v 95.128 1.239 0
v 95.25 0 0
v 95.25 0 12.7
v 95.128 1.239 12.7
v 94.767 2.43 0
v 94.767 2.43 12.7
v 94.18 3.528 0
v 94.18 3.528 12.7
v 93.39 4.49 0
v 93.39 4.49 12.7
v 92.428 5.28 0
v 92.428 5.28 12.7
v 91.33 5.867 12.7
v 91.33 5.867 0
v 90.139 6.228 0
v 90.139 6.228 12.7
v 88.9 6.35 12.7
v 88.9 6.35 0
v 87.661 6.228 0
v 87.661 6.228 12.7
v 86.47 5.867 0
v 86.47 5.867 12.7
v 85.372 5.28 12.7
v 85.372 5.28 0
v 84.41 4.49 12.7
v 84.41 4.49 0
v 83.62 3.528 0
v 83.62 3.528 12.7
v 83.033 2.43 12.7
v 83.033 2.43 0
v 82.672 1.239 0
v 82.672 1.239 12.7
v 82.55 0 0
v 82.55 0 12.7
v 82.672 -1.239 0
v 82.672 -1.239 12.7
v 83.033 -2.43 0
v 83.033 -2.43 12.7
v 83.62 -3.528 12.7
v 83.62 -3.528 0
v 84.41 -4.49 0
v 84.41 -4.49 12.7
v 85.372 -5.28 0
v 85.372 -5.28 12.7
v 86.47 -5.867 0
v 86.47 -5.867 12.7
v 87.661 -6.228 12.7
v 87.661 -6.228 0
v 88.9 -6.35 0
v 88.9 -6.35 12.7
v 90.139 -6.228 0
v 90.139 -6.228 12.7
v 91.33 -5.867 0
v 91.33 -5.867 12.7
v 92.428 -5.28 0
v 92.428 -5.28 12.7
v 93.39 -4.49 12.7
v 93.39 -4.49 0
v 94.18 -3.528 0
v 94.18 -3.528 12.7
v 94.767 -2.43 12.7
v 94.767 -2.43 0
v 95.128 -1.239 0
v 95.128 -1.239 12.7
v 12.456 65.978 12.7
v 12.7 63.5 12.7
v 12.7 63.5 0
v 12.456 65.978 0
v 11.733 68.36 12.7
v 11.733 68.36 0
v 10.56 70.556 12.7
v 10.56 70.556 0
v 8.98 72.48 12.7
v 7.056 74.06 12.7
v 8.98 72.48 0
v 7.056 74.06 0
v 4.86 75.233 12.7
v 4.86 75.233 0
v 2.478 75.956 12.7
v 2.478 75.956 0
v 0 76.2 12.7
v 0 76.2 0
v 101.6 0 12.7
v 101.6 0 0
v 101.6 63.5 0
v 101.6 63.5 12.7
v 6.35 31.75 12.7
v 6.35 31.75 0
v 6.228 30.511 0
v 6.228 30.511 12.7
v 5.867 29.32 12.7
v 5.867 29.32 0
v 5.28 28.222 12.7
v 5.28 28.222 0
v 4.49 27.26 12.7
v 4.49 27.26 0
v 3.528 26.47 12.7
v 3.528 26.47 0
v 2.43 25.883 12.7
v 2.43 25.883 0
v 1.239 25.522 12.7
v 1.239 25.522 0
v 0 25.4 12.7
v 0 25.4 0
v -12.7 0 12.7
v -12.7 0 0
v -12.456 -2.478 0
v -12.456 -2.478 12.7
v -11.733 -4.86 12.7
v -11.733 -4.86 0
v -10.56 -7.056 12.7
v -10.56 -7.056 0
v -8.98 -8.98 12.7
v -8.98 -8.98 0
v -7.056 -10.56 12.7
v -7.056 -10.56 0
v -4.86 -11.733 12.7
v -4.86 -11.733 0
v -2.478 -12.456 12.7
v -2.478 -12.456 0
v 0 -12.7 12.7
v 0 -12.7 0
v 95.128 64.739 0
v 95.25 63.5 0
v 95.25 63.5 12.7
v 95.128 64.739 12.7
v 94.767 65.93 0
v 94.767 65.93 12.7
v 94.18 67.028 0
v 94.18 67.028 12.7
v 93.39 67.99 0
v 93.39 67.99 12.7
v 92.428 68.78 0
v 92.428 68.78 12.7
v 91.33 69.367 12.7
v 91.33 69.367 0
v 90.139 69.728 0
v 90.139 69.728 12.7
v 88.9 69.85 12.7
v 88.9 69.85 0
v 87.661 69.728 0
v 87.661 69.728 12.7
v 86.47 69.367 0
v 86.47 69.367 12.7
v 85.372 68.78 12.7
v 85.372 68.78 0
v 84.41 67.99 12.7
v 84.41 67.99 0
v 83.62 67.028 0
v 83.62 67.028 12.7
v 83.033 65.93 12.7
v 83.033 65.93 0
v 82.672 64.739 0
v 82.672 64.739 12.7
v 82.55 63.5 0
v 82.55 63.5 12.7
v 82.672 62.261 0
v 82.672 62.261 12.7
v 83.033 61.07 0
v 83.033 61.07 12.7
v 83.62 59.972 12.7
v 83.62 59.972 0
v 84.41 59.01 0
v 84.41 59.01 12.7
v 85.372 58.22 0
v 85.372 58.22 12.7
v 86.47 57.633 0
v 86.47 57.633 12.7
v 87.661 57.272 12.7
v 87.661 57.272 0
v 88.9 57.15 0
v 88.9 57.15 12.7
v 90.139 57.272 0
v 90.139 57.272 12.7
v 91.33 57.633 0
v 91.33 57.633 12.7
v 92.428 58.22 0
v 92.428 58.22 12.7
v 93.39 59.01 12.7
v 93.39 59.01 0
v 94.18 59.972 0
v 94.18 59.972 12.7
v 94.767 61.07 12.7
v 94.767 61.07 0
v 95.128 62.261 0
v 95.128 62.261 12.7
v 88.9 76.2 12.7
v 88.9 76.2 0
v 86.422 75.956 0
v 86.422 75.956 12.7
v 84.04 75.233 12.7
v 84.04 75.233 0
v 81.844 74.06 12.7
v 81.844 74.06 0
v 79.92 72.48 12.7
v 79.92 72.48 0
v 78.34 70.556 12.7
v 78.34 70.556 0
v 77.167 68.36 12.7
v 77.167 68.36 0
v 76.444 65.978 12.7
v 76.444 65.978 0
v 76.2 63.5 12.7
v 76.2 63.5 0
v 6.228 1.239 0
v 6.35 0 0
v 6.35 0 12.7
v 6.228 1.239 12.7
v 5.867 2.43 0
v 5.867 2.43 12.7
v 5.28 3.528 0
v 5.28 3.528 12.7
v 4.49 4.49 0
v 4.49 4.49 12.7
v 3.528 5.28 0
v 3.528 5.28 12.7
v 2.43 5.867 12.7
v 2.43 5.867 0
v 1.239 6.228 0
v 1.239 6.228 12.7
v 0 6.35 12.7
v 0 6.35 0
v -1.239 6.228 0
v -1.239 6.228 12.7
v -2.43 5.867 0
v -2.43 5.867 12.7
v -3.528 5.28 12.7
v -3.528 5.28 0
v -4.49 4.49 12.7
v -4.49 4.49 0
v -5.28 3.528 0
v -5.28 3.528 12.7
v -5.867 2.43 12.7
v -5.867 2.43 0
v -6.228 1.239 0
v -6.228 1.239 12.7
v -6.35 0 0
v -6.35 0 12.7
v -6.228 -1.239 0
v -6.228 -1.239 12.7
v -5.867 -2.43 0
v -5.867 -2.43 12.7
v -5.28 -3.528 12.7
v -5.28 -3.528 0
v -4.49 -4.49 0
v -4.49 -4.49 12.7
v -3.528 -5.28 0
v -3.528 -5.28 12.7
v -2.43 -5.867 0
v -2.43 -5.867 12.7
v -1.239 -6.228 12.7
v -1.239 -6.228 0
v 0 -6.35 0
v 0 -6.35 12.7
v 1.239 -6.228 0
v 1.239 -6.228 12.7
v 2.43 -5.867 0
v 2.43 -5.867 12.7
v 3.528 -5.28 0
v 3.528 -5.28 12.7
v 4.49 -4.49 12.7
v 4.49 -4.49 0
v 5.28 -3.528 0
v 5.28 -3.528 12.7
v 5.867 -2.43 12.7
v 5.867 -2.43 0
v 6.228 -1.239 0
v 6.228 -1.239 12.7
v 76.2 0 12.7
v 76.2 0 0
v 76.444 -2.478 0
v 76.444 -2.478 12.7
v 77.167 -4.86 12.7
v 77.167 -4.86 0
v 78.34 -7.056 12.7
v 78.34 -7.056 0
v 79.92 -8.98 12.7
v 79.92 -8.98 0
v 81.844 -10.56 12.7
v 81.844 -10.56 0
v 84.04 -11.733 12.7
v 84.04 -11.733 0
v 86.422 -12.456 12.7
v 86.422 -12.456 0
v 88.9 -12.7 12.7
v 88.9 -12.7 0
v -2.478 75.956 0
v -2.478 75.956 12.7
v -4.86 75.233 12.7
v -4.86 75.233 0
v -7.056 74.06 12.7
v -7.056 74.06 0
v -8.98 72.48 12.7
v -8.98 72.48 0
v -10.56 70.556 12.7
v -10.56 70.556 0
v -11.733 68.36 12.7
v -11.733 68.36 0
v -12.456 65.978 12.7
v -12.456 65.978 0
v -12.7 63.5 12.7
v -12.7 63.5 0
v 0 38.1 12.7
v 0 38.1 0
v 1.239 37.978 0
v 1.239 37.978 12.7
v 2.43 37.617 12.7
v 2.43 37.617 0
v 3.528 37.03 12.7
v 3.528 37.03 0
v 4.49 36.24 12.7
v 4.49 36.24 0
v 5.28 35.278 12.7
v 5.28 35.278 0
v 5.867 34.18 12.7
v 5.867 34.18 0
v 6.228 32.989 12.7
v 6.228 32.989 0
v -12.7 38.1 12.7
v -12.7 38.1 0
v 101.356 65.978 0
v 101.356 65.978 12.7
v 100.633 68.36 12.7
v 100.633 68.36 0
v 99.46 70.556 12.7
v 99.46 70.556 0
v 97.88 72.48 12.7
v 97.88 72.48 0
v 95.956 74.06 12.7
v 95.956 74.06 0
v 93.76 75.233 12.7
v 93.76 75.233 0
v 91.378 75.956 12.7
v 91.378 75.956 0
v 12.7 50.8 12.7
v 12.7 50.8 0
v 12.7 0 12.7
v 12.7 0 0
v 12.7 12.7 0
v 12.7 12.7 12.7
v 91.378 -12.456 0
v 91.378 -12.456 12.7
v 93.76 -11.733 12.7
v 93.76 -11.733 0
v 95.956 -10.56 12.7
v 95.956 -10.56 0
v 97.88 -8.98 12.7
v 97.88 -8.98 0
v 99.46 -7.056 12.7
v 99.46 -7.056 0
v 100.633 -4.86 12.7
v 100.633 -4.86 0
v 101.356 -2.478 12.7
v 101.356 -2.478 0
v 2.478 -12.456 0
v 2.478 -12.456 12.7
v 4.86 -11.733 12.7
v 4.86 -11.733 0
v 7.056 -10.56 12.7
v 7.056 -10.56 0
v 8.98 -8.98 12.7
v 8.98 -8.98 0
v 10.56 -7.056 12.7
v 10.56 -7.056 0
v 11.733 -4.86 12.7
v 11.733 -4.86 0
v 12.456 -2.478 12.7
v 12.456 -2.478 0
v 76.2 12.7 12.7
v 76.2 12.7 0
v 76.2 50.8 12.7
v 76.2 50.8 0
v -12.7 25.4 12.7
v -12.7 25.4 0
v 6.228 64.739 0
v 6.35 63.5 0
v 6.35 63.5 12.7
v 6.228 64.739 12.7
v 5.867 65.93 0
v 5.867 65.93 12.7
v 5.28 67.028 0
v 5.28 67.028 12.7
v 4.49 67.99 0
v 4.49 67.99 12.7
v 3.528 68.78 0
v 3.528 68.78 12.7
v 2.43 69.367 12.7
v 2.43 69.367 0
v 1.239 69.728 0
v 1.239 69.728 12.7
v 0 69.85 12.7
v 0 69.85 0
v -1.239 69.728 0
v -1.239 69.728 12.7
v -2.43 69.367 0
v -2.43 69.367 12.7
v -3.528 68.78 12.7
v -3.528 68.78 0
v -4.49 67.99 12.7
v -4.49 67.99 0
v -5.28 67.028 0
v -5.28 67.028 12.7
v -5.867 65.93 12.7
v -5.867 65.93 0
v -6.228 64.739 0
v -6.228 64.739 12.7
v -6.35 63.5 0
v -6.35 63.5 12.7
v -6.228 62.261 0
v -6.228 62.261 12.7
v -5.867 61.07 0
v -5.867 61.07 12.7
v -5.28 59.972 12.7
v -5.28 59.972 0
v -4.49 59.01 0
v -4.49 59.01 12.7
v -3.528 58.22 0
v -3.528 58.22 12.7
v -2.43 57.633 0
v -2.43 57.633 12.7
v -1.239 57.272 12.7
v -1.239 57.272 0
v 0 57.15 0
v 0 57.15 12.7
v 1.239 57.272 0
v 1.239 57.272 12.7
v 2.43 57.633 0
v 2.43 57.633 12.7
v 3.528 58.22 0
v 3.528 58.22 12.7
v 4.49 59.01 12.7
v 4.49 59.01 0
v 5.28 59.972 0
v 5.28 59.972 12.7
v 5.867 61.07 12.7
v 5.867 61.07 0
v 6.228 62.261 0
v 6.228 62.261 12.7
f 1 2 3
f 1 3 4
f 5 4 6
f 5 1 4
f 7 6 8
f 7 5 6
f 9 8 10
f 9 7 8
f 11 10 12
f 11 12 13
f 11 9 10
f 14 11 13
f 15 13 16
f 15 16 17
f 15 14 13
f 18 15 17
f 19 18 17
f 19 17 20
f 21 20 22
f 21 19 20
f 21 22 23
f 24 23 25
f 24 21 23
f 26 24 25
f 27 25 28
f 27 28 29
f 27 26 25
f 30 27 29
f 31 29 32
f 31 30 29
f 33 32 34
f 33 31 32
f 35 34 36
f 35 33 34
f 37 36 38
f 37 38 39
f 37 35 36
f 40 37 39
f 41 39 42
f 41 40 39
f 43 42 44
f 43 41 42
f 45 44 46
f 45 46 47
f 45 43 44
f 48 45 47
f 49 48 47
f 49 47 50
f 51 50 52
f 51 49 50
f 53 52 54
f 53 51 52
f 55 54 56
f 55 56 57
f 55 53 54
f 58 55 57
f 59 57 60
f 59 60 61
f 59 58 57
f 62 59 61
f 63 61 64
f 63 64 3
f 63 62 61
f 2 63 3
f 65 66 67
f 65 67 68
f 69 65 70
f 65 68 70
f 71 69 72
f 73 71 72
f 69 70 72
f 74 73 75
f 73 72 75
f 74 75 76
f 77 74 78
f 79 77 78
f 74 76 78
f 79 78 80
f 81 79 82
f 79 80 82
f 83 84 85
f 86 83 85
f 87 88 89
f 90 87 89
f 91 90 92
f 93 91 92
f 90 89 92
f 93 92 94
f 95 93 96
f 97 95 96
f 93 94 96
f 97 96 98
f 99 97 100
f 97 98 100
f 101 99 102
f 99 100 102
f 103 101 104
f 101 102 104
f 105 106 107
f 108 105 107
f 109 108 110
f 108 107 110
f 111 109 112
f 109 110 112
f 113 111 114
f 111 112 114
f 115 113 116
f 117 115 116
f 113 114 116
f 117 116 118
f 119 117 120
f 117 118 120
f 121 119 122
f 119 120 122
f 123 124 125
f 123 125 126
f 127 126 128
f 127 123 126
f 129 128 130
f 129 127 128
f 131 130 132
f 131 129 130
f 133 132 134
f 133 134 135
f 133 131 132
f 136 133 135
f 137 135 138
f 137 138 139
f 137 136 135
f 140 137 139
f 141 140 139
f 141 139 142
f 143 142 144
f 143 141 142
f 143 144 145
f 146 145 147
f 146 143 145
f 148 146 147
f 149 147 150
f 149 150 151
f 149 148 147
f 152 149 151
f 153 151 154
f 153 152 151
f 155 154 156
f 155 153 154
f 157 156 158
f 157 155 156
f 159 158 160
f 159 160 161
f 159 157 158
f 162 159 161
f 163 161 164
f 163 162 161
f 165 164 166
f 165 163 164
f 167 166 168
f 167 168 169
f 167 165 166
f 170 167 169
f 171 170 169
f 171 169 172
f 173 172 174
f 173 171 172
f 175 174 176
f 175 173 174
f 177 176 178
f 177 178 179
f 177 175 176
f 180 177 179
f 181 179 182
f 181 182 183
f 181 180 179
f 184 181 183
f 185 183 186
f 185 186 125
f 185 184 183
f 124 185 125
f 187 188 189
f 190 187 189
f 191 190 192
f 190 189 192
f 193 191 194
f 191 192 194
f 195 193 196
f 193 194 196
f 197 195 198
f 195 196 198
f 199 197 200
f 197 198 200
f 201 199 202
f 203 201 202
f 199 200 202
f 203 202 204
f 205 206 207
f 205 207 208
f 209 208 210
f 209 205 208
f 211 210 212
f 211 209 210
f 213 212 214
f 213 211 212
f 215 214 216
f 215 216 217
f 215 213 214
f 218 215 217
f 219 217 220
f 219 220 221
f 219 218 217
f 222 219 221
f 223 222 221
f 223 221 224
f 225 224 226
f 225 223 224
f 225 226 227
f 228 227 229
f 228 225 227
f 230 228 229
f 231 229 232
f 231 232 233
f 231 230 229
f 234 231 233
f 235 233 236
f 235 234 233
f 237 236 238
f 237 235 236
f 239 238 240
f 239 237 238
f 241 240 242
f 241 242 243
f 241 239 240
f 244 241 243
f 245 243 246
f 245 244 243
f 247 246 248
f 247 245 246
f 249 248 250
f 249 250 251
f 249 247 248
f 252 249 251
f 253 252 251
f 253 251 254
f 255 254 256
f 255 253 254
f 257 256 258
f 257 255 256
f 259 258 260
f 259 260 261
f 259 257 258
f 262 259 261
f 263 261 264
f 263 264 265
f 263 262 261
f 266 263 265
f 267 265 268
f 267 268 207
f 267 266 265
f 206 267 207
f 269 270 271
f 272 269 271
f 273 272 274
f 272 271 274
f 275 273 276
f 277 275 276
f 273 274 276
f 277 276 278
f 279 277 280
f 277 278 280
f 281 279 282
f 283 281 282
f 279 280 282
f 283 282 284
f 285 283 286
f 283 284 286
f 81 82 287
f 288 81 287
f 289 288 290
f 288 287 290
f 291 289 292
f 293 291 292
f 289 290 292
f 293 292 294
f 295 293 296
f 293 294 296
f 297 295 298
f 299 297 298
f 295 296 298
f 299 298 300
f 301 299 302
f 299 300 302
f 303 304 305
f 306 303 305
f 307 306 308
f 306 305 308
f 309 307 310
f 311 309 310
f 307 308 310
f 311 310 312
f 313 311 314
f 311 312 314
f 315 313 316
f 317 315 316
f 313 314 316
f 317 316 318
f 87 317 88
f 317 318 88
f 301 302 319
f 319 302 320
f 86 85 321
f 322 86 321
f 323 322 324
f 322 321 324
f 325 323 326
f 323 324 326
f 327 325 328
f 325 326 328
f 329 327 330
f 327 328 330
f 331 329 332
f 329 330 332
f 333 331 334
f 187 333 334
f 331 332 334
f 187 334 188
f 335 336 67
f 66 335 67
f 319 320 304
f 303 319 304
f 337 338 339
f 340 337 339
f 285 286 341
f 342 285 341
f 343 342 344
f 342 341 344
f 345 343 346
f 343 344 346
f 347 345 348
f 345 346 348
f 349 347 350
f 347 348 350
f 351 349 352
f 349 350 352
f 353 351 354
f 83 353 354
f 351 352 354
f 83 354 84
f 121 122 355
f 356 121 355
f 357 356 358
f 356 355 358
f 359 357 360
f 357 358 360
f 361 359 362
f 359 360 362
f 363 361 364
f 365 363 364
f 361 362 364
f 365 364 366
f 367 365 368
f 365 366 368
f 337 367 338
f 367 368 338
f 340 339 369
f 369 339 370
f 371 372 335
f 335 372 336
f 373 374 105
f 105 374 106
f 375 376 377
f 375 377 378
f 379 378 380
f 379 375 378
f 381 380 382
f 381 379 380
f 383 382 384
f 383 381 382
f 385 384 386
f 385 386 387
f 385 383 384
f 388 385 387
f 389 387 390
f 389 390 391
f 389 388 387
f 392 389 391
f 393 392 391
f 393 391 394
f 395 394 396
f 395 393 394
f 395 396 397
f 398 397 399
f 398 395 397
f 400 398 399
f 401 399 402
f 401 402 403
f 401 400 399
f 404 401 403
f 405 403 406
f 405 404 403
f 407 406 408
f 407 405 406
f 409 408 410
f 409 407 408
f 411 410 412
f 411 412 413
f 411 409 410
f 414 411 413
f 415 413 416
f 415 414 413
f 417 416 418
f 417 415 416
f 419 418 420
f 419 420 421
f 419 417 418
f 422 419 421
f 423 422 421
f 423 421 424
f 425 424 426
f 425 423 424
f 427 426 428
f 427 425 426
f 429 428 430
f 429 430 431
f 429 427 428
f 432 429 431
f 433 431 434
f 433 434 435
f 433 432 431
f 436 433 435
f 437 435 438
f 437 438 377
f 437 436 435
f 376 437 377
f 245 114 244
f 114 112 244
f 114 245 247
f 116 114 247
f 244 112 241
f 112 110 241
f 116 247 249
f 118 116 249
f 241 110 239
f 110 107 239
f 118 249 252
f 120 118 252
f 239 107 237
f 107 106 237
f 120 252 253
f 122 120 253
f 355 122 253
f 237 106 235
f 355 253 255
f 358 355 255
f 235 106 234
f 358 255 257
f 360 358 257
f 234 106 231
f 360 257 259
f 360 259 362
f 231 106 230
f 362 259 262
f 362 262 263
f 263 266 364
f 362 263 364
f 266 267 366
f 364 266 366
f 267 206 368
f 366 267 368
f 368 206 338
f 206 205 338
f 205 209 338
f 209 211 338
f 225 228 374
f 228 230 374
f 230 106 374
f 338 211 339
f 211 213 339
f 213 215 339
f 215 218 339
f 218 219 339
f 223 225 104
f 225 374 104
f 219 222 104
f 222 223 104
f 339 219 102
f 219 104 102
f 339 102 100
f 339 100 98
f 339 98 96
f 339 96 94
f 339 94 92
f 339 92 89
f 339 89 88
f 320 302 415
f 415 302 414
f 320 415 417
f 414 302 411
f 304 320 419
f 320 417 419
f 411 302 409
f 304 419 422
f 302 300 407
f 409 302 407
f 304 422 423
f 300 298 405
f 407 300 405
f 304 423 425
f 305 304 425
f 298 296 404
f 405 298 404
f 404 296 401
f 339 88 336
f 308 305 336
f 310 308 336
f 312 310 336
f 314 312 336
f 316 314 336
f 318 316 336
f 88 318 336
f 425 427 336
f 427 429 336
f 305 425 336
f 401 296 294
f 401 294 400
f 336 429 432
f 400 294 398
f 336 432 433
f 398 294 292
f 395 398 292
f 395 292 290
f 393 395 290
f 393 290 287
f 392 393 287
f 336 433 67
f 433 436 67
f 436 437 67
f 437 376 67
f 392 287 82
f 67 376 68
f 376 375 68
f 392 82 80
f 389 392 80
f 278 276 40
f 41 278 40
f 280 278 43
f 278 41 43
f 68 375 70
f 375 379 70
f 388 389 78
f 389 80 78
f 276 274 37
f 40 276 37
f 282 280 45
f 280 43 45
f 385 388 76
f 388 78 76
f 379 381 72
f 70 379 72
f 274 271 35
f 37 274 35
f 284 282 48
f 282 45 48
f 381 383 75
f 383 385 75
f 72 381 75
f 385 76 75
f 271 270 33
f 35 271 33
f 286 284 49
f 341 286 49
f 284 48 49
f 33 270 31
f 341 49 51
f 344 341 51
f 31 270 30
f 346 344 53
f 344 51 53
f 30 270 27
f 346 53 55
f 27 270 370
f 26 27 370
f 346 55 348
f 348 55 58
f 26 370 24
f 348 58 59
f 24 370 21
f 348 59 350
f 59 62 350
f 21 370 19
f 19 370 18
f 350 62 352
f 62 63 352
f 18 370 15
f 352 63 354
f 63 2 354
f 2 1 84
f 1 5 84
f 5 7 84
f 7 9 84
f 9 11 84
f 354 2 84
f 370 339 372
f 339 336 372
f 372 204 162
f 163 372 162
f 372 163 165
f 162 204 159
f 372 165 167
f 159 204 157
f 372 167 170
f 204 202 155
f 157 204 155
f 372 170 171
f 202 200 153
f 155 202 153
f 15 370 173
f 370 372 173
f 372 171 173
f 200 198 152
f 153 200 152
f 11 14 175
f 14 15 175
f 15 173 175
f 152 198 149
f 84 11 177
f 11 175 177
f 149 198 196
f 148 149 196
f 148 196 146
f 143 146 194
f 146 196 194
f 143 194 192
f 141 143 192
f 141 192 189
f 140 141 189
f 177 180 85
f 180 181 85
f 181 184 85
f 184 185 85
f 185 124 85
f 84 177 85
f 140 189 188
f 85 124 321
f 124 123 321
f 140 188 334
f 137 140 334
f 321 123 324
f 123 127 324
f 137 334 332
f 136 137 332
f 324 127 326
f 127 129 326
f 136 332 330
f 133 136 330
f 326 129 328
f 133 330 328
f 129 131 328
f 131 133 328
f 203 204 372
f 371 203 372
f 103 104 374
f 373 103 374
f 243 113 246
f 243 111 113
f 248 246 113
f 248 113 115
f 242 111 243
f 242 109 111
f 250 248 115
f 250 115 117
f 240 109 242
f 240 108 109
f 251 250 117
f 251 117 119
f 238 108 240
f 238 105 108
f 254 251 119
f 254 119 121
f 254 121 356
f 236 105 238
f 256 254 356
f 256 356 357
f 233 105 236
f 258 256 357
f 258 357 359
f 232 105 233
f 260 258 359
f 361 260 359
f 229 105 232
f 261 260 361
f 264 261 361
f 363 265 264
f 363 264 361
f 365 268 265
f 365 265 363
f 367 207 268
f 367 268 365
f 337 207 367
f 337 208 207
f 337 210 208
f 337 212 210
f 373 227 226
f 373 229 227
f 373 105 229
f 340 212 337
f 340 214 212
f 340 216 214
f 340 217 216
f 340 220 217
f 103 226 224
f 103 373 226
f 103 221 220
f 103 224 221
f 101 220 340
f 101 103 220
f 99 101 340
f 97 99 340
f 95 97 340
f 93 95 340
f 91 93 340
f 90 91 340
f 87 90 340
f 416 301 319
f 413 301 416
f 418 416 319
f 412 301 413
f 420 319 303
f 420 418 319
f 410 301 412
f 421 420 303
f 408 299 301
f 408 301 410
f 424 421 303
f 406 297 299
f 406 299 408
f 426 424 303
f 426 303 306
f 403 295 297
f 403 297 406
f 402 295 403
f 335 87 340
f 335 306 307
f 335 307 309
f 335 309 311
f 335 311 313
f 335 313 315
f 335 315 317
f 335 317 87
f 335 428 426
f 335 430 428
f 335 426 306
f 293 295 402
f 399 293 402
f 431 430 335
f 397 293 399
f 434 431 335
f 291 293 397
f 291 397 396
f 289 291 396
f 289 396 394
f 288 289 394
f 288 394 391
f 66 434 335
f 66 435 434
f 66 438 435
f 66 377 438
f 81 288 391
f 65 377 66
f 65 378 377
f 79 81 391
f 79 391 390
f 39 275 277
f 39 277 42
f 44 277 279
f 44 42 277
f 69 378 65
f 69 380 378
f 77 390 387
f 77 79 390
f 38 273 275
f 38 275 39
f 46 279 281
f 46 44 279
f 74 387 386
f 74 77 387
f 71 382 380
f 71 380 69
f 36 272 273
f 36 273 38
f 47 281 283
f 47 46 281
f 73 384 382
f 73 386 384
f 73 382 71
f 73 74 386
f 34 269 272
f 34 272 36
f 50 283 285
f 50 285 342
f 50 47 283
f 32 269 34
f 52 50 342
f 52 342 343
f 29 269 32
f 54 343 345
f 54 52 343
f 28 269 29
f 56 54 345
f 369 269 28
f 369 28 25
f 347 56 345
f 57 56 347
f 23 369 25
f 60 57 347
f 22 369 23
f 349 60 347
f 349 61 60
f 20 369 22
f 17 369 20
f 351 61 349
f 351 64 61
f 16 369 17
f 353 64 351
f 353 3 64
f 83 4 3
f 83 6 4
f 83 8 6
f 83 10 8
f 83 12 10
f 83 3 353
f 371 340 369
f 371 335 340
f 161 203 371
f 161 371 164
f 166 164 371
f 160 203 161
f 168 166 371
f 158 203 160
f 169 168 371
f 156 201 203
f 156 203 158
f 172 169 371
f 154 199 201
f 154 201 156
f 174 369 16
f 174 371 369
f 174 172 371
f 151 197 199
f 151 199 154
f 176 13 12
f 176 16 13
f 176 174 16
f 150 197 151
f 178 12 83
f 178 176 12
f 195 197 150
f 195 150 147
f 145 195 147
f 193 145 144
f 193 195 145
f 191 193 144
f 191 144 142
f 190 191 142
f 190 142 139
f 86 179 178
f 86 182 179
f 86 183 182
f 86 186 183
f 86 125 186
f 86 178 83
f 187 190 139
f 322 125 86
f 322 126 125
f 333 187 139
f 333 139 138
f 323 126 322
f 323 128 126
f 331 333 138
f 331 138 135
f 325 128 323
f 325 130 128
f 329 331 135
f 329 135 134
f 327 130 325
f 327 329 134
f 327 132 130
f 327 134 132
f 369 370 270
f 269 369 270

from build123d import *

# Parameters (mm, degrees)
F0_R     = 6.35
F1_DEPTH = 12.7


with BuildPart() as f1:
    # F0 (on Top) → F1 (new body)
    with BuildSketch(Plane.XY):
        with BuildLine():
            ThreePointArc((76.2, 0), (79.919744, -8.980256), (88.9, -12.7))
            ThreePointArc((88.9, -12.7), (97.880256, -8.980256), (101.6, 0))
            Line((101.6, 0), (101.6, 12.7))
            Line((101.6, 12.7), (101.6, 50.8))
            Line((101.6, 50.8), (101.6, 63.5))
            ThreePointArc((101.6, 63.5), (97.880256, 72.480256), (88.9, 76.2))
            ThreePointArc((88.9, 76.2), (79.919744, 72.480256), (76.2, 63.5))
            Line((76.2, 63.5), (76.2, 50.8))
            Line((76.2, 50.8), (12.7, 50.8))
            Line((12.7, 50.8), (12.7, 63.5))
            ThreePointArc((12.7, 63.5), (8.980256, 72.480256), (0, 76.2))
            ThreePointArc((0, 76.2), (-8.980256, 72.480256), (-12.7, 63.5))
            Line((-12.7, 63.5), (-12.7, 50.8))
            Line((-12.7, 50.8), (-12.7, 38.1))
            Line((-12.7, 38.1), (0, 38.1))
            ThreePointArc((0, 38.1), (4.490128, 36.240128), (6.35, 31.75))
            ThreePointArc((6.35, 31.75), (4.490128, 27.259872), (0, 25.4))
            Line((0, 25.4), (-12.7, 25.4))
            Line((-12.7, 25.4), (-12.7, 12.7))
            Line((-12.7, 12.7), (-12.7, 0))
            ThreePointArc((-12.7, 0), (-8.980256, -8.980256), (0, -12.7))
            ThreePointArc((0, -12.7), (8.980256, -8.980256), (12.7, 0))
            Line((12.7, 0), (12.7, 12.7))
            Line((12.7, 12.7), (76.2, 12.7))
            Line((76.2, 12.7), (76.2, 0))
        make_face()
        Circle(F0_R, mode=Mode.SUBTRACT)
        with Locations((88.9, 0)):
            Circle(F0_R, mode=Mode.SUBTRACT)
        with Locations((0, 63.5)):
            Circle(F0_R, mode=Mode.SUBTRACT)
        with Locations((88.9, 63.5)):
            Circle(F0_R, mode=Mode.SUBTRACT)
    extrude(amount=F1_DEPTH)


solid = f1.part
